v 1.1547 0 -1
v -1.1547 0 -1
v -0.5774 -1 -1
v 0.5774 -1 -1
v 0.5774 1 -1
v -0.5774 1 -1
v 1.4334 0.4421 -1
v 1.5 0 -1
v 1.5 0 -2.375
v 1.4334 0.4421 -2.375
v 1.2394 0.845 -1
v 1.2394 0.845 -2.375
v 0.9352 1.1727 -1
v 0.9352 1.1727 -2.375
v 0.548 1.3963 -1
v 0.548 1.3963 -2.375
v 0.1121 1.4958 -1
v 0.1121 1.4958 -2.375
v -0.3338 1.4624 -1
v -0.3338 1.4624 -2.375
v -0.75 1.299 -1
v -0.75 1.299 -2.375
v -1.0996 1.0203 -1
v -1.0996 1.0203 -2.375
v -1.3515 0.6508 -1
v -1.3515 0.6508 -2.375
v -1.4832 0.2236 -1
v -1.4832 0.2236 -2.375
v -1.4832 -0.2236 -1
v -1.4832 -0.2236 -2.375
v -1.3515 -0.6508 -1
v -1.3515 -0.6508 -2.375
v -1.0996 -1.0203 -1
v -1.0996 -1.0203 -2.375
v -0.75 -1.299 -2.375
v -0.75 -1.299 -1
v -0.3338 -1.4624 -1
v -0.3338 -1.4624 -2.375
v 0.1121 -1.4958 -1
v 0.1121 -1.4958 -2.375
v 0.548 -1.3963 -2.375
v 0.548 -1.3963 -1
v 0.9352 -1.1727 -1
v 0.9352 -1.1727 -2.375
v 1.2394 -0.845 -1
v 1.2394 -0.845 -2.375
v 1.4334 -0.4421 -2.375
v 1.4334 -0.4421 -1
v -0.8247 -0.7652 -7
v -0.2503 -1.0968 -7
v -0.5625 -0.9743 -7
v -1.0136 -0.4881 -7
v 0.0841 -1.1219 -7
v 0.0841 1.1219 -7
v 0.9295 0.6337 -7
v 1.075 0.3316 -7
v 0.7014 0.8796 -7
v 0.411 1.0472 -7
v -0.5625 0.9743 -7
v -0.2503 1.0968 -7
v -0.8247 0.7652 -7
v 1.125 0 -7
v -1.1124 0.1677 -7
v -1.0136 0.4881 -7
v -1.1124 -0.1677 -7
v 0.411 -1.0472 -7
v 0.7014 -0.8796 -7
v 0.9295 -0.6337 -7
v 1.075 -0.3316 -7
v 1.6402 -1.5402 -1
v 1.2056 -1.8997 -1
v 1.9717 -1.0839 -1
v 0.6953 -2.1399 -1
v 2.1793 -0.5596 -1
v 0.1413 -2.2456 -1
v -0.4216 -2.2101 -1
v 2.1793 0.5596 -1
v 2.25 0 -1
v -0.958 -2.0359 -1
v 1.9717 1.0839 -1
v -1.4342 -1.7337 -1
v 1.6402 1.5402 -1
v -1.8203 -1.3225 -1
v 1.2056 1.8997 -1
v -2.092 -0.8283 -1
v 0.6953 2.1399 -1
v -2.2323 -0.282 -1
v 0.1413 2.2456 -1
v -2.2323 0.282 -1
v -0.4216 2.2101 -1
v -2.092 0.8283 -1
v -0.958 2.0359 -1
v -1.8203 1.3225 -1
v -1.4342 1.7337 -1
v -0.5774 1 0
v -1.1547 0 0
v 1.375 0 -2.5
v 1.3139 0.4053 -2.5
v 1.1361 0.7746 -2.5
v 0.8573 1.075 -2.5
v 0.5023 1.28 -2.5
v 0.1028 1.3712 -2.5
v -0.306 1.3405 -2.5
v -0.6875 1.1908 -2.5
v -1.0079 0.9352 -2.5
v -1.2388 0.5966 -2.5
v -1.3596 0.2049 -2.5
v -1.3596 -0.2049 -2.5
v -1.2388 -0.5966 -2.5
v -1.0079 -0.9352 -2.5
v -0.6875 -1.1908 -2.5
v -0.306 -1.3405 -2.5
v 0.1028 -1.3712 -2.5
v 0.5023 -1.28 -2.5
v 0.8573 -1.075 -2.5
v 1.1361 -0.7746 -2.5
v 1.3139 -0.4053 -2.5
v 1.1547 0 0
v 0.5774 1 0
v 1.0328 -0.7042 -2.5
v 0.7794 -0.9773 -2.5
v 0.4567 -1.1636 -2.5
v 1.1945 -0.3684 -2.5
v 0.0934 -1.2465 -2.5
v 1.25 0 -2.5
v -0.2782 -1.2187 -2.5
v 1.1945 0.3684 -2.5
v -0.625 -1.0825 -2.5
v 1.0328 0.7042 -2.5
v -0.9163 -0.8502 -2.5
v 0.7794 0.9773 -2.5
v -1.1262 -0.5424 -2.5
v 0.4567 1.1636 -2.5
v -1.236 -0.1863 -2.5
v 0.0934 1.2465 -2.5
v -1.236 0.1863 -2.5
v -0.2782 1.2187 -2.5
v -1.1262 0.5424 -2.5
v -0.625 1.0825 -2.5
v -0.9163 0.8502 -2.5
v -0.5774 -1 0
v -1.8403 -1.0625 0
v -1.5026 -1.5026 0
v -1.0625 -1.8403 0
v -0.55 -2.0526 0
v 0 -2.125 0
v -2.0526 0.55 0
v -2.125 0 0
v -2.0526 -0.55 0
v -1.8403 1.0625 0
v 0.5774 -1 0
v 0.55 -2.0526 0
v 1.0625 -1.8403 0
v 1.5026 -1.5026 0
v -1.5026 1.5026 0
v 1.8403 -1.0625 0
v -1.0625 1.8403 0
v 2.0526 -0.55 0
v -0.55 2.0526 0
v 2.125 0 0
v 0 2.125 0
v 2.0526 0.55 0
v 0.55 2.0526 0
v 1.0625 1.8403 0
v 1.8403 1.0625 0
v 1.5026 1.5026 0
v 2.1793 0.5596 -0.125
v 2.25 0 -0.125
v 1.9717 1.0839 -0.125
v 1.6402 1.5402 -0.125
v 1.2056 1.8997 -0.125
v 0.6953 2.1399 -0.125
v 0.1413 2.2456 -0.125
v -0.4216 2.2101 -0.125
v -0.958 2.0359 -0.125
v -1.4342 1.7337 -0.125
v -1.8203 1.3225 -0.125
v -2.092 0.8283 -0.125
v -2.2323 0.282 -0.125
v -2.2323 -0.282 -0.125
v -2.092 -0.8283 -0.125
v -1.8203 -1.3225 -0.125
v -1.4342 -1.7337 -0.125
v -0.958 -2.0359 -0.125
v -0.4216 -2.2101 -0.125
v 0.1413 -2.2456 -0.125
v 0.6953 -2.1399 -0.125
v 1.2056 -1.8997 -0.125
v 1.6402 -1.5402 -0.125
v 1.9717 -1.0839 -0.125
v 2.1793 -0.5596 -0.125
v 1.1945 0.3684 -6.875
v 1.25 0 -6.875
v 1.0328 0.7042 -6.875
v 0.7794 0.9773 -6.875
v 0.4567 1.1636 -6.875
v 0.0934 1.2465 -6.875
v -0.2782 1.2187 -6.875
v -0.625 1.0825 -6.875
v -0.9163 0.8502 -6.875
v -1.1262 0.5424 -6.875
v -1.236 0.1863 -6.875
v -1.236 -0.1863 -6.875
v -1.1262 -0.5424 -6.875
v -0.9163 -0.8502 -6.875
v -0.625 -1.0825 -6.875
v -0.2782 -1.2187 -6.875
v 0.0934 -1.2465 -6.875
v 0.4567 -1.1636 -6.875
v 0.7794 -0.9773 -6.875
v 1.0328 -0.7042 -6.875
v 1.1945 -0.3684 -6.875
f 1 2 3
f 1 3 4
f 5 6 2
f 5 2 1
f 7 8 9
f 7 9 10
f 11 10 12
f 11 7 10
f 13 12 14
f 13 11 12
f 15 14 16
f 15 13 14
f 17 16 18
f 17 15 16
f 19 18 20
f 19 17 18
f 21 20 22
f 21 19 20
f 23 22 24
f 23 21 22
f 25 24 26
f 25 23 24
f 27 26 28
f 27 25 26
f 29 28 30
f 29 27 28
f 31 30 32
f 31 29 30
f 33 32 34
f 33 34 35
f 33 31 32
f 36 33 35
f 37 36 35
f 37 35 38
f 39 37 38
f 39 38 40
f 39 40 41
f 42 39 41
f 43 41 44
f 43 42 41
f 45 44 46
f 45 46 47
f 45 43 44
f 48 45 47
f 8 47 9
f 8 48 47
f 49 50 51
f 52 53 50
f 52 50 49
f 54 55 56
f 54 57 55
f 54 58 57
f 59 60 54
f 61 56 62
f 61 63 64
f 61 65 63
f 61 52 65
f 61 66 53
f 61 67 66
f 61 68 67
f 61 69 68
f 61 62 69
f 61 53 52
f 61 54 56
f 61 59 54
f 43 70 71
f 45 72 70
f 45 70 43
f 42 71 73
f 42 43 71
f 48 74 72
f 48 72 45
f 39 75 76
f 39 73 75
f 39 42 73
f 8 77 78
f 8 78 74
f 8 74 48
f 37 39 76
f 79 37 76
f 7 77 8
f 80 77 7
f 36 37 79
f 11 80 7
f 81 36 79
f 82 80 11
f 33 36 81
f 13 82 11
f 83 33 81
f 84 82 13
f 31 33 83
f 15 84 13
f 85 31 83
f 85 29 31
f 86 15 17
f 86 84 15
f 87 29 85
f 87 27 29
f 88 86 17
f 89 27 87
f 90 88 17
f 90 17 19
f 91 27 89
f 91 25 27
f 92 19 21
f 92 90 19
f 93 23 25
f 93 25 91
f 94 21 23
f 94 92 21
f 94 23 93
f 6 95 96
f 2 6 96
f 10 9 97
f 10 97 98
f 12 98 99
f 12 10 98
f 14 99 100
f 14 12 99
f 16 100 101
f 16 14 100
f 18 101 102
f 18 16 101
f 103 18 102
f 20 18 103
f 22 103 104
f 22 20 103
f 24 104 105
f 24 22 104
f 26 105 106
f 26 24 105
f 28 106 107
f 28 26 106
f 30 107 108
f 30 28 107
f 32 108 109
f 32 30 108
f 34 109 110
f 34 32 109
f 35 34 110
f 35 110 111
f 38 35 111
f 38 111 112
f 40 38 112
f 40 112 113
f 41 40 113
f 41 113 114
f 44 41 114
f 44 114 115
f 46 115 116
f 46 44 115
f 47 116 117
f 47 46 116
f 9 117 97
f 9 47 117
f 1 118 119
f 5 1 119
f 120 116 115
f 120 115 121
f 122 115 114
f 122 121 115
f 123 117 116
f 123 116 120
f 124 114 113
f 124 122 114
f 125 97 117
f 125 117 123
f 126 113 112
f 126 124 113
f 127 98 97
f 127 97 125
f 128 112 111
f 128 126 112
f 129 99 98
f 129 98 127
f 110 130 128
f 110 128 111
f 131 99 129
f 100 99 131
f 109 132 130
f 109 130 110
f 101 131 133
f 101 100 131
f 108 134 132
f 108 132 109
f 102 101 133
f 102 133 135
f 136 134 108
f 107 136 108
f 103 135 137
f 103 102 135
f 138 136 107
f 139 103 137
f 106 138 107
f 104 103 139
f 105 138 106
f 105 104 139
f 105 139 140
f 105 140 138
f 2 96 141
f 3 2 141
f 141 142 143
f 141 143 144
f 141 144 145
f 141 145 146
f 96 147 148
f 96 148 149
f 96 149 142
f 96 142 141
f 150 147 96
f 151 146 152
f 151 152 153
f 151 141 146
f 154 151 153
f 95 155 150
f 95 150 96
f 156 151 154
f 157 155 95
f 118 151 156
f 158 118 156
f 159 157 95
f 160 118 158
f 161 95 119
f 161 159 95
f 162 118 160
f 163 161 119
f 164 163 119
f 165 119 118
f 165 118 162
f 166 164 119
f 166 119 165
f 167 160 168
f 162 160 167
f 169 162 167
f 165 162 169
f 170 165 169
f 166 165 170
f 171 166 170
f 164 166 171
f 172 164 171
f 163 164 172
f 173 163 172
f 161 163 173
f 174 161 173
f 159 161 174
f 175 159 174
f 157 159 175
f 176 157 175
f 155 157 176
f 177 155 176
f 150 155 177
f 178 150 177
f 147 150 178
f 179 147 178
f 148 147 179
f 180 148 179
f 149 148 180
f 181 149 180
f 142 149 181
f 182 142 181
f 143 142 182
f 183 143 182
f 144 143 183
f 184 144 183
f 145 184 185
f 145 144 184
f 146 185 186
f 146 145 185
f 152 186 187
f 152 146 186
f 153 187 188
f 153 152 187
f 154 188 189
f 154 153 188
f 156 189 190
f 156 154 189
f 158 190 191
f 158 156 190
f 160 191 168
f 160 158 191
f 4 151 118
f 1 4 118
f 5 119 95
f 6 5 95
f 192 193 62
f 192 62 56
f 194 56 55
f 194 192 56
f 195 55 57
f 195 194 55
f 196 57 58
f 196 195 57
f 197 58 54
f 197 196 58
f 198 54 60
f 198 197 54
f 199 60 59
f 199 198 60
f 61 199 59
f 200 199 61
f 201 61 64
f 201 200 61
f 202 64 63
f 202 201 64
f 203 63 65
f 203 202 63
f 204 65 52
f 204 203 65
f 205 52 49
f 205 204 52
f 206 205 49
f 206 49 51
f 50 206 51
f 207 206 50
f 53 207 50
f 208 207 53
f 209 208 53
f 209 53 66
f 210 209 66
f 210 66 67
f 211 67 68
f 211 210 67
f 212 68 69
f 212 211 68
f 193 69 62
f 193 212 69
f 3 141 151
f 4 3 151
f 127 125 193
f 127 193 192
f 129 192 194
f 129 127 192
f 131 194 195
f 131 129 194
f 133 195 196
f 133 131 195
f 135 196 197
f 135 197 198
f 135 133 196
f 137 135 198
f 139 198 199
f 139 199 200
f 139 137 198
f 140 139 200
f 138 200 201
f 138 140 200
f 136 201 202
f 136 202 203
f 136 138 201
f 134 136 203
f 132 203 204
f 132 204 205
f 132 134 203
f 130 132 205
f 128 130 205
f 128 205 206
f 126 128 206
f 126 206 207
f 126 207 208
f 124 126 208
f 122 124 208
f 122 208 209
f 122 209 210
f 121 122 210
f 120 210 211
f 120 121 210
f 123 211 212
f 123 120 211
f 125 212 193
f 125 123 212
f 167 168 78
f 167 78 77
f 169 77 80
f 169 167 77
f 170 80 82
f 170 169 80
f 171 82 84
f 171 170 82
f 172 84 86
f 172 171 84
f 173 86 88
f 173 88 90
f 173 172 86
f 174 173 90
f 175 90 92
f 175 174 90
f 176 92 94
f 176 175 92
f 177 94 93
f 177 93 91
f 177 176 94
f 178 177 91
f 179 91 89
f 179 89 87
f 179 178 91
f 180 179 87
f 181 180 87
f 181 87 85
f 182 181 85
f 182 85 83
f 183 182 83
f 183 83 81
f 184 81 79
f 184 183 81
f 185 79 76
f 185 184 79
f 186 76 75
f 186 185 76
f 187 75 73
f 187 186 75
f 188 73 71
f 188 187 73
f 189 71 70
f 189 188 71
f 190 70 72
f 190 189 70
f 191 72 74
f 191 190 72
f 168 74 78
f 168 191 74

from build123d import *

# Parameters (mm, degrees)
CUT_EXTRUDE1_DEPTH = 1
CHAMFER1_SIZE      = 0.125


with BuildPart() as part:
    # Sketch1 → Revolve1 (revolve)
    with BuildSketch(Plane(origin=(0, 0, 0), x_dir=(1, 0, 0), z_dir=(0, 1, 0))):
        Polygon((0, 0), (0, 7), (1.25, 7), (1.25, 2.5), (1.5, 2.5), (1.5, 1), (2.25, 1), (2.25, 0), align=None)
    revolve(axis=Axis((0, 0, 0), (0, 0, 1)))

    # Sketch2 → Cut-Extrude1 (cut)
    with BuildSketch(Plane.XY):
        Polygon((1.154700538, 0), (0.577350269, 1), (-0.577350269, 1), (-1.154700538, 0), (-0.577350269, -1), (0.577350269, -1), align=None)
    extrude(amount=-CUT_EXTRUDE1_DEPTH, mode=Mode.SUBTRACT)

    # Chamfer1
    chamfer1_edges = [part.edges().sort_by_distance(p)[0] for p in [
        (-2.25, 0, 0),
        (-1.5, 0, -2.5),
        (-1.25, 0, -7),
    ]]
    chamfer(chamfer1_edges, length=CHAMFER1_SIZE)


solid = part.part
